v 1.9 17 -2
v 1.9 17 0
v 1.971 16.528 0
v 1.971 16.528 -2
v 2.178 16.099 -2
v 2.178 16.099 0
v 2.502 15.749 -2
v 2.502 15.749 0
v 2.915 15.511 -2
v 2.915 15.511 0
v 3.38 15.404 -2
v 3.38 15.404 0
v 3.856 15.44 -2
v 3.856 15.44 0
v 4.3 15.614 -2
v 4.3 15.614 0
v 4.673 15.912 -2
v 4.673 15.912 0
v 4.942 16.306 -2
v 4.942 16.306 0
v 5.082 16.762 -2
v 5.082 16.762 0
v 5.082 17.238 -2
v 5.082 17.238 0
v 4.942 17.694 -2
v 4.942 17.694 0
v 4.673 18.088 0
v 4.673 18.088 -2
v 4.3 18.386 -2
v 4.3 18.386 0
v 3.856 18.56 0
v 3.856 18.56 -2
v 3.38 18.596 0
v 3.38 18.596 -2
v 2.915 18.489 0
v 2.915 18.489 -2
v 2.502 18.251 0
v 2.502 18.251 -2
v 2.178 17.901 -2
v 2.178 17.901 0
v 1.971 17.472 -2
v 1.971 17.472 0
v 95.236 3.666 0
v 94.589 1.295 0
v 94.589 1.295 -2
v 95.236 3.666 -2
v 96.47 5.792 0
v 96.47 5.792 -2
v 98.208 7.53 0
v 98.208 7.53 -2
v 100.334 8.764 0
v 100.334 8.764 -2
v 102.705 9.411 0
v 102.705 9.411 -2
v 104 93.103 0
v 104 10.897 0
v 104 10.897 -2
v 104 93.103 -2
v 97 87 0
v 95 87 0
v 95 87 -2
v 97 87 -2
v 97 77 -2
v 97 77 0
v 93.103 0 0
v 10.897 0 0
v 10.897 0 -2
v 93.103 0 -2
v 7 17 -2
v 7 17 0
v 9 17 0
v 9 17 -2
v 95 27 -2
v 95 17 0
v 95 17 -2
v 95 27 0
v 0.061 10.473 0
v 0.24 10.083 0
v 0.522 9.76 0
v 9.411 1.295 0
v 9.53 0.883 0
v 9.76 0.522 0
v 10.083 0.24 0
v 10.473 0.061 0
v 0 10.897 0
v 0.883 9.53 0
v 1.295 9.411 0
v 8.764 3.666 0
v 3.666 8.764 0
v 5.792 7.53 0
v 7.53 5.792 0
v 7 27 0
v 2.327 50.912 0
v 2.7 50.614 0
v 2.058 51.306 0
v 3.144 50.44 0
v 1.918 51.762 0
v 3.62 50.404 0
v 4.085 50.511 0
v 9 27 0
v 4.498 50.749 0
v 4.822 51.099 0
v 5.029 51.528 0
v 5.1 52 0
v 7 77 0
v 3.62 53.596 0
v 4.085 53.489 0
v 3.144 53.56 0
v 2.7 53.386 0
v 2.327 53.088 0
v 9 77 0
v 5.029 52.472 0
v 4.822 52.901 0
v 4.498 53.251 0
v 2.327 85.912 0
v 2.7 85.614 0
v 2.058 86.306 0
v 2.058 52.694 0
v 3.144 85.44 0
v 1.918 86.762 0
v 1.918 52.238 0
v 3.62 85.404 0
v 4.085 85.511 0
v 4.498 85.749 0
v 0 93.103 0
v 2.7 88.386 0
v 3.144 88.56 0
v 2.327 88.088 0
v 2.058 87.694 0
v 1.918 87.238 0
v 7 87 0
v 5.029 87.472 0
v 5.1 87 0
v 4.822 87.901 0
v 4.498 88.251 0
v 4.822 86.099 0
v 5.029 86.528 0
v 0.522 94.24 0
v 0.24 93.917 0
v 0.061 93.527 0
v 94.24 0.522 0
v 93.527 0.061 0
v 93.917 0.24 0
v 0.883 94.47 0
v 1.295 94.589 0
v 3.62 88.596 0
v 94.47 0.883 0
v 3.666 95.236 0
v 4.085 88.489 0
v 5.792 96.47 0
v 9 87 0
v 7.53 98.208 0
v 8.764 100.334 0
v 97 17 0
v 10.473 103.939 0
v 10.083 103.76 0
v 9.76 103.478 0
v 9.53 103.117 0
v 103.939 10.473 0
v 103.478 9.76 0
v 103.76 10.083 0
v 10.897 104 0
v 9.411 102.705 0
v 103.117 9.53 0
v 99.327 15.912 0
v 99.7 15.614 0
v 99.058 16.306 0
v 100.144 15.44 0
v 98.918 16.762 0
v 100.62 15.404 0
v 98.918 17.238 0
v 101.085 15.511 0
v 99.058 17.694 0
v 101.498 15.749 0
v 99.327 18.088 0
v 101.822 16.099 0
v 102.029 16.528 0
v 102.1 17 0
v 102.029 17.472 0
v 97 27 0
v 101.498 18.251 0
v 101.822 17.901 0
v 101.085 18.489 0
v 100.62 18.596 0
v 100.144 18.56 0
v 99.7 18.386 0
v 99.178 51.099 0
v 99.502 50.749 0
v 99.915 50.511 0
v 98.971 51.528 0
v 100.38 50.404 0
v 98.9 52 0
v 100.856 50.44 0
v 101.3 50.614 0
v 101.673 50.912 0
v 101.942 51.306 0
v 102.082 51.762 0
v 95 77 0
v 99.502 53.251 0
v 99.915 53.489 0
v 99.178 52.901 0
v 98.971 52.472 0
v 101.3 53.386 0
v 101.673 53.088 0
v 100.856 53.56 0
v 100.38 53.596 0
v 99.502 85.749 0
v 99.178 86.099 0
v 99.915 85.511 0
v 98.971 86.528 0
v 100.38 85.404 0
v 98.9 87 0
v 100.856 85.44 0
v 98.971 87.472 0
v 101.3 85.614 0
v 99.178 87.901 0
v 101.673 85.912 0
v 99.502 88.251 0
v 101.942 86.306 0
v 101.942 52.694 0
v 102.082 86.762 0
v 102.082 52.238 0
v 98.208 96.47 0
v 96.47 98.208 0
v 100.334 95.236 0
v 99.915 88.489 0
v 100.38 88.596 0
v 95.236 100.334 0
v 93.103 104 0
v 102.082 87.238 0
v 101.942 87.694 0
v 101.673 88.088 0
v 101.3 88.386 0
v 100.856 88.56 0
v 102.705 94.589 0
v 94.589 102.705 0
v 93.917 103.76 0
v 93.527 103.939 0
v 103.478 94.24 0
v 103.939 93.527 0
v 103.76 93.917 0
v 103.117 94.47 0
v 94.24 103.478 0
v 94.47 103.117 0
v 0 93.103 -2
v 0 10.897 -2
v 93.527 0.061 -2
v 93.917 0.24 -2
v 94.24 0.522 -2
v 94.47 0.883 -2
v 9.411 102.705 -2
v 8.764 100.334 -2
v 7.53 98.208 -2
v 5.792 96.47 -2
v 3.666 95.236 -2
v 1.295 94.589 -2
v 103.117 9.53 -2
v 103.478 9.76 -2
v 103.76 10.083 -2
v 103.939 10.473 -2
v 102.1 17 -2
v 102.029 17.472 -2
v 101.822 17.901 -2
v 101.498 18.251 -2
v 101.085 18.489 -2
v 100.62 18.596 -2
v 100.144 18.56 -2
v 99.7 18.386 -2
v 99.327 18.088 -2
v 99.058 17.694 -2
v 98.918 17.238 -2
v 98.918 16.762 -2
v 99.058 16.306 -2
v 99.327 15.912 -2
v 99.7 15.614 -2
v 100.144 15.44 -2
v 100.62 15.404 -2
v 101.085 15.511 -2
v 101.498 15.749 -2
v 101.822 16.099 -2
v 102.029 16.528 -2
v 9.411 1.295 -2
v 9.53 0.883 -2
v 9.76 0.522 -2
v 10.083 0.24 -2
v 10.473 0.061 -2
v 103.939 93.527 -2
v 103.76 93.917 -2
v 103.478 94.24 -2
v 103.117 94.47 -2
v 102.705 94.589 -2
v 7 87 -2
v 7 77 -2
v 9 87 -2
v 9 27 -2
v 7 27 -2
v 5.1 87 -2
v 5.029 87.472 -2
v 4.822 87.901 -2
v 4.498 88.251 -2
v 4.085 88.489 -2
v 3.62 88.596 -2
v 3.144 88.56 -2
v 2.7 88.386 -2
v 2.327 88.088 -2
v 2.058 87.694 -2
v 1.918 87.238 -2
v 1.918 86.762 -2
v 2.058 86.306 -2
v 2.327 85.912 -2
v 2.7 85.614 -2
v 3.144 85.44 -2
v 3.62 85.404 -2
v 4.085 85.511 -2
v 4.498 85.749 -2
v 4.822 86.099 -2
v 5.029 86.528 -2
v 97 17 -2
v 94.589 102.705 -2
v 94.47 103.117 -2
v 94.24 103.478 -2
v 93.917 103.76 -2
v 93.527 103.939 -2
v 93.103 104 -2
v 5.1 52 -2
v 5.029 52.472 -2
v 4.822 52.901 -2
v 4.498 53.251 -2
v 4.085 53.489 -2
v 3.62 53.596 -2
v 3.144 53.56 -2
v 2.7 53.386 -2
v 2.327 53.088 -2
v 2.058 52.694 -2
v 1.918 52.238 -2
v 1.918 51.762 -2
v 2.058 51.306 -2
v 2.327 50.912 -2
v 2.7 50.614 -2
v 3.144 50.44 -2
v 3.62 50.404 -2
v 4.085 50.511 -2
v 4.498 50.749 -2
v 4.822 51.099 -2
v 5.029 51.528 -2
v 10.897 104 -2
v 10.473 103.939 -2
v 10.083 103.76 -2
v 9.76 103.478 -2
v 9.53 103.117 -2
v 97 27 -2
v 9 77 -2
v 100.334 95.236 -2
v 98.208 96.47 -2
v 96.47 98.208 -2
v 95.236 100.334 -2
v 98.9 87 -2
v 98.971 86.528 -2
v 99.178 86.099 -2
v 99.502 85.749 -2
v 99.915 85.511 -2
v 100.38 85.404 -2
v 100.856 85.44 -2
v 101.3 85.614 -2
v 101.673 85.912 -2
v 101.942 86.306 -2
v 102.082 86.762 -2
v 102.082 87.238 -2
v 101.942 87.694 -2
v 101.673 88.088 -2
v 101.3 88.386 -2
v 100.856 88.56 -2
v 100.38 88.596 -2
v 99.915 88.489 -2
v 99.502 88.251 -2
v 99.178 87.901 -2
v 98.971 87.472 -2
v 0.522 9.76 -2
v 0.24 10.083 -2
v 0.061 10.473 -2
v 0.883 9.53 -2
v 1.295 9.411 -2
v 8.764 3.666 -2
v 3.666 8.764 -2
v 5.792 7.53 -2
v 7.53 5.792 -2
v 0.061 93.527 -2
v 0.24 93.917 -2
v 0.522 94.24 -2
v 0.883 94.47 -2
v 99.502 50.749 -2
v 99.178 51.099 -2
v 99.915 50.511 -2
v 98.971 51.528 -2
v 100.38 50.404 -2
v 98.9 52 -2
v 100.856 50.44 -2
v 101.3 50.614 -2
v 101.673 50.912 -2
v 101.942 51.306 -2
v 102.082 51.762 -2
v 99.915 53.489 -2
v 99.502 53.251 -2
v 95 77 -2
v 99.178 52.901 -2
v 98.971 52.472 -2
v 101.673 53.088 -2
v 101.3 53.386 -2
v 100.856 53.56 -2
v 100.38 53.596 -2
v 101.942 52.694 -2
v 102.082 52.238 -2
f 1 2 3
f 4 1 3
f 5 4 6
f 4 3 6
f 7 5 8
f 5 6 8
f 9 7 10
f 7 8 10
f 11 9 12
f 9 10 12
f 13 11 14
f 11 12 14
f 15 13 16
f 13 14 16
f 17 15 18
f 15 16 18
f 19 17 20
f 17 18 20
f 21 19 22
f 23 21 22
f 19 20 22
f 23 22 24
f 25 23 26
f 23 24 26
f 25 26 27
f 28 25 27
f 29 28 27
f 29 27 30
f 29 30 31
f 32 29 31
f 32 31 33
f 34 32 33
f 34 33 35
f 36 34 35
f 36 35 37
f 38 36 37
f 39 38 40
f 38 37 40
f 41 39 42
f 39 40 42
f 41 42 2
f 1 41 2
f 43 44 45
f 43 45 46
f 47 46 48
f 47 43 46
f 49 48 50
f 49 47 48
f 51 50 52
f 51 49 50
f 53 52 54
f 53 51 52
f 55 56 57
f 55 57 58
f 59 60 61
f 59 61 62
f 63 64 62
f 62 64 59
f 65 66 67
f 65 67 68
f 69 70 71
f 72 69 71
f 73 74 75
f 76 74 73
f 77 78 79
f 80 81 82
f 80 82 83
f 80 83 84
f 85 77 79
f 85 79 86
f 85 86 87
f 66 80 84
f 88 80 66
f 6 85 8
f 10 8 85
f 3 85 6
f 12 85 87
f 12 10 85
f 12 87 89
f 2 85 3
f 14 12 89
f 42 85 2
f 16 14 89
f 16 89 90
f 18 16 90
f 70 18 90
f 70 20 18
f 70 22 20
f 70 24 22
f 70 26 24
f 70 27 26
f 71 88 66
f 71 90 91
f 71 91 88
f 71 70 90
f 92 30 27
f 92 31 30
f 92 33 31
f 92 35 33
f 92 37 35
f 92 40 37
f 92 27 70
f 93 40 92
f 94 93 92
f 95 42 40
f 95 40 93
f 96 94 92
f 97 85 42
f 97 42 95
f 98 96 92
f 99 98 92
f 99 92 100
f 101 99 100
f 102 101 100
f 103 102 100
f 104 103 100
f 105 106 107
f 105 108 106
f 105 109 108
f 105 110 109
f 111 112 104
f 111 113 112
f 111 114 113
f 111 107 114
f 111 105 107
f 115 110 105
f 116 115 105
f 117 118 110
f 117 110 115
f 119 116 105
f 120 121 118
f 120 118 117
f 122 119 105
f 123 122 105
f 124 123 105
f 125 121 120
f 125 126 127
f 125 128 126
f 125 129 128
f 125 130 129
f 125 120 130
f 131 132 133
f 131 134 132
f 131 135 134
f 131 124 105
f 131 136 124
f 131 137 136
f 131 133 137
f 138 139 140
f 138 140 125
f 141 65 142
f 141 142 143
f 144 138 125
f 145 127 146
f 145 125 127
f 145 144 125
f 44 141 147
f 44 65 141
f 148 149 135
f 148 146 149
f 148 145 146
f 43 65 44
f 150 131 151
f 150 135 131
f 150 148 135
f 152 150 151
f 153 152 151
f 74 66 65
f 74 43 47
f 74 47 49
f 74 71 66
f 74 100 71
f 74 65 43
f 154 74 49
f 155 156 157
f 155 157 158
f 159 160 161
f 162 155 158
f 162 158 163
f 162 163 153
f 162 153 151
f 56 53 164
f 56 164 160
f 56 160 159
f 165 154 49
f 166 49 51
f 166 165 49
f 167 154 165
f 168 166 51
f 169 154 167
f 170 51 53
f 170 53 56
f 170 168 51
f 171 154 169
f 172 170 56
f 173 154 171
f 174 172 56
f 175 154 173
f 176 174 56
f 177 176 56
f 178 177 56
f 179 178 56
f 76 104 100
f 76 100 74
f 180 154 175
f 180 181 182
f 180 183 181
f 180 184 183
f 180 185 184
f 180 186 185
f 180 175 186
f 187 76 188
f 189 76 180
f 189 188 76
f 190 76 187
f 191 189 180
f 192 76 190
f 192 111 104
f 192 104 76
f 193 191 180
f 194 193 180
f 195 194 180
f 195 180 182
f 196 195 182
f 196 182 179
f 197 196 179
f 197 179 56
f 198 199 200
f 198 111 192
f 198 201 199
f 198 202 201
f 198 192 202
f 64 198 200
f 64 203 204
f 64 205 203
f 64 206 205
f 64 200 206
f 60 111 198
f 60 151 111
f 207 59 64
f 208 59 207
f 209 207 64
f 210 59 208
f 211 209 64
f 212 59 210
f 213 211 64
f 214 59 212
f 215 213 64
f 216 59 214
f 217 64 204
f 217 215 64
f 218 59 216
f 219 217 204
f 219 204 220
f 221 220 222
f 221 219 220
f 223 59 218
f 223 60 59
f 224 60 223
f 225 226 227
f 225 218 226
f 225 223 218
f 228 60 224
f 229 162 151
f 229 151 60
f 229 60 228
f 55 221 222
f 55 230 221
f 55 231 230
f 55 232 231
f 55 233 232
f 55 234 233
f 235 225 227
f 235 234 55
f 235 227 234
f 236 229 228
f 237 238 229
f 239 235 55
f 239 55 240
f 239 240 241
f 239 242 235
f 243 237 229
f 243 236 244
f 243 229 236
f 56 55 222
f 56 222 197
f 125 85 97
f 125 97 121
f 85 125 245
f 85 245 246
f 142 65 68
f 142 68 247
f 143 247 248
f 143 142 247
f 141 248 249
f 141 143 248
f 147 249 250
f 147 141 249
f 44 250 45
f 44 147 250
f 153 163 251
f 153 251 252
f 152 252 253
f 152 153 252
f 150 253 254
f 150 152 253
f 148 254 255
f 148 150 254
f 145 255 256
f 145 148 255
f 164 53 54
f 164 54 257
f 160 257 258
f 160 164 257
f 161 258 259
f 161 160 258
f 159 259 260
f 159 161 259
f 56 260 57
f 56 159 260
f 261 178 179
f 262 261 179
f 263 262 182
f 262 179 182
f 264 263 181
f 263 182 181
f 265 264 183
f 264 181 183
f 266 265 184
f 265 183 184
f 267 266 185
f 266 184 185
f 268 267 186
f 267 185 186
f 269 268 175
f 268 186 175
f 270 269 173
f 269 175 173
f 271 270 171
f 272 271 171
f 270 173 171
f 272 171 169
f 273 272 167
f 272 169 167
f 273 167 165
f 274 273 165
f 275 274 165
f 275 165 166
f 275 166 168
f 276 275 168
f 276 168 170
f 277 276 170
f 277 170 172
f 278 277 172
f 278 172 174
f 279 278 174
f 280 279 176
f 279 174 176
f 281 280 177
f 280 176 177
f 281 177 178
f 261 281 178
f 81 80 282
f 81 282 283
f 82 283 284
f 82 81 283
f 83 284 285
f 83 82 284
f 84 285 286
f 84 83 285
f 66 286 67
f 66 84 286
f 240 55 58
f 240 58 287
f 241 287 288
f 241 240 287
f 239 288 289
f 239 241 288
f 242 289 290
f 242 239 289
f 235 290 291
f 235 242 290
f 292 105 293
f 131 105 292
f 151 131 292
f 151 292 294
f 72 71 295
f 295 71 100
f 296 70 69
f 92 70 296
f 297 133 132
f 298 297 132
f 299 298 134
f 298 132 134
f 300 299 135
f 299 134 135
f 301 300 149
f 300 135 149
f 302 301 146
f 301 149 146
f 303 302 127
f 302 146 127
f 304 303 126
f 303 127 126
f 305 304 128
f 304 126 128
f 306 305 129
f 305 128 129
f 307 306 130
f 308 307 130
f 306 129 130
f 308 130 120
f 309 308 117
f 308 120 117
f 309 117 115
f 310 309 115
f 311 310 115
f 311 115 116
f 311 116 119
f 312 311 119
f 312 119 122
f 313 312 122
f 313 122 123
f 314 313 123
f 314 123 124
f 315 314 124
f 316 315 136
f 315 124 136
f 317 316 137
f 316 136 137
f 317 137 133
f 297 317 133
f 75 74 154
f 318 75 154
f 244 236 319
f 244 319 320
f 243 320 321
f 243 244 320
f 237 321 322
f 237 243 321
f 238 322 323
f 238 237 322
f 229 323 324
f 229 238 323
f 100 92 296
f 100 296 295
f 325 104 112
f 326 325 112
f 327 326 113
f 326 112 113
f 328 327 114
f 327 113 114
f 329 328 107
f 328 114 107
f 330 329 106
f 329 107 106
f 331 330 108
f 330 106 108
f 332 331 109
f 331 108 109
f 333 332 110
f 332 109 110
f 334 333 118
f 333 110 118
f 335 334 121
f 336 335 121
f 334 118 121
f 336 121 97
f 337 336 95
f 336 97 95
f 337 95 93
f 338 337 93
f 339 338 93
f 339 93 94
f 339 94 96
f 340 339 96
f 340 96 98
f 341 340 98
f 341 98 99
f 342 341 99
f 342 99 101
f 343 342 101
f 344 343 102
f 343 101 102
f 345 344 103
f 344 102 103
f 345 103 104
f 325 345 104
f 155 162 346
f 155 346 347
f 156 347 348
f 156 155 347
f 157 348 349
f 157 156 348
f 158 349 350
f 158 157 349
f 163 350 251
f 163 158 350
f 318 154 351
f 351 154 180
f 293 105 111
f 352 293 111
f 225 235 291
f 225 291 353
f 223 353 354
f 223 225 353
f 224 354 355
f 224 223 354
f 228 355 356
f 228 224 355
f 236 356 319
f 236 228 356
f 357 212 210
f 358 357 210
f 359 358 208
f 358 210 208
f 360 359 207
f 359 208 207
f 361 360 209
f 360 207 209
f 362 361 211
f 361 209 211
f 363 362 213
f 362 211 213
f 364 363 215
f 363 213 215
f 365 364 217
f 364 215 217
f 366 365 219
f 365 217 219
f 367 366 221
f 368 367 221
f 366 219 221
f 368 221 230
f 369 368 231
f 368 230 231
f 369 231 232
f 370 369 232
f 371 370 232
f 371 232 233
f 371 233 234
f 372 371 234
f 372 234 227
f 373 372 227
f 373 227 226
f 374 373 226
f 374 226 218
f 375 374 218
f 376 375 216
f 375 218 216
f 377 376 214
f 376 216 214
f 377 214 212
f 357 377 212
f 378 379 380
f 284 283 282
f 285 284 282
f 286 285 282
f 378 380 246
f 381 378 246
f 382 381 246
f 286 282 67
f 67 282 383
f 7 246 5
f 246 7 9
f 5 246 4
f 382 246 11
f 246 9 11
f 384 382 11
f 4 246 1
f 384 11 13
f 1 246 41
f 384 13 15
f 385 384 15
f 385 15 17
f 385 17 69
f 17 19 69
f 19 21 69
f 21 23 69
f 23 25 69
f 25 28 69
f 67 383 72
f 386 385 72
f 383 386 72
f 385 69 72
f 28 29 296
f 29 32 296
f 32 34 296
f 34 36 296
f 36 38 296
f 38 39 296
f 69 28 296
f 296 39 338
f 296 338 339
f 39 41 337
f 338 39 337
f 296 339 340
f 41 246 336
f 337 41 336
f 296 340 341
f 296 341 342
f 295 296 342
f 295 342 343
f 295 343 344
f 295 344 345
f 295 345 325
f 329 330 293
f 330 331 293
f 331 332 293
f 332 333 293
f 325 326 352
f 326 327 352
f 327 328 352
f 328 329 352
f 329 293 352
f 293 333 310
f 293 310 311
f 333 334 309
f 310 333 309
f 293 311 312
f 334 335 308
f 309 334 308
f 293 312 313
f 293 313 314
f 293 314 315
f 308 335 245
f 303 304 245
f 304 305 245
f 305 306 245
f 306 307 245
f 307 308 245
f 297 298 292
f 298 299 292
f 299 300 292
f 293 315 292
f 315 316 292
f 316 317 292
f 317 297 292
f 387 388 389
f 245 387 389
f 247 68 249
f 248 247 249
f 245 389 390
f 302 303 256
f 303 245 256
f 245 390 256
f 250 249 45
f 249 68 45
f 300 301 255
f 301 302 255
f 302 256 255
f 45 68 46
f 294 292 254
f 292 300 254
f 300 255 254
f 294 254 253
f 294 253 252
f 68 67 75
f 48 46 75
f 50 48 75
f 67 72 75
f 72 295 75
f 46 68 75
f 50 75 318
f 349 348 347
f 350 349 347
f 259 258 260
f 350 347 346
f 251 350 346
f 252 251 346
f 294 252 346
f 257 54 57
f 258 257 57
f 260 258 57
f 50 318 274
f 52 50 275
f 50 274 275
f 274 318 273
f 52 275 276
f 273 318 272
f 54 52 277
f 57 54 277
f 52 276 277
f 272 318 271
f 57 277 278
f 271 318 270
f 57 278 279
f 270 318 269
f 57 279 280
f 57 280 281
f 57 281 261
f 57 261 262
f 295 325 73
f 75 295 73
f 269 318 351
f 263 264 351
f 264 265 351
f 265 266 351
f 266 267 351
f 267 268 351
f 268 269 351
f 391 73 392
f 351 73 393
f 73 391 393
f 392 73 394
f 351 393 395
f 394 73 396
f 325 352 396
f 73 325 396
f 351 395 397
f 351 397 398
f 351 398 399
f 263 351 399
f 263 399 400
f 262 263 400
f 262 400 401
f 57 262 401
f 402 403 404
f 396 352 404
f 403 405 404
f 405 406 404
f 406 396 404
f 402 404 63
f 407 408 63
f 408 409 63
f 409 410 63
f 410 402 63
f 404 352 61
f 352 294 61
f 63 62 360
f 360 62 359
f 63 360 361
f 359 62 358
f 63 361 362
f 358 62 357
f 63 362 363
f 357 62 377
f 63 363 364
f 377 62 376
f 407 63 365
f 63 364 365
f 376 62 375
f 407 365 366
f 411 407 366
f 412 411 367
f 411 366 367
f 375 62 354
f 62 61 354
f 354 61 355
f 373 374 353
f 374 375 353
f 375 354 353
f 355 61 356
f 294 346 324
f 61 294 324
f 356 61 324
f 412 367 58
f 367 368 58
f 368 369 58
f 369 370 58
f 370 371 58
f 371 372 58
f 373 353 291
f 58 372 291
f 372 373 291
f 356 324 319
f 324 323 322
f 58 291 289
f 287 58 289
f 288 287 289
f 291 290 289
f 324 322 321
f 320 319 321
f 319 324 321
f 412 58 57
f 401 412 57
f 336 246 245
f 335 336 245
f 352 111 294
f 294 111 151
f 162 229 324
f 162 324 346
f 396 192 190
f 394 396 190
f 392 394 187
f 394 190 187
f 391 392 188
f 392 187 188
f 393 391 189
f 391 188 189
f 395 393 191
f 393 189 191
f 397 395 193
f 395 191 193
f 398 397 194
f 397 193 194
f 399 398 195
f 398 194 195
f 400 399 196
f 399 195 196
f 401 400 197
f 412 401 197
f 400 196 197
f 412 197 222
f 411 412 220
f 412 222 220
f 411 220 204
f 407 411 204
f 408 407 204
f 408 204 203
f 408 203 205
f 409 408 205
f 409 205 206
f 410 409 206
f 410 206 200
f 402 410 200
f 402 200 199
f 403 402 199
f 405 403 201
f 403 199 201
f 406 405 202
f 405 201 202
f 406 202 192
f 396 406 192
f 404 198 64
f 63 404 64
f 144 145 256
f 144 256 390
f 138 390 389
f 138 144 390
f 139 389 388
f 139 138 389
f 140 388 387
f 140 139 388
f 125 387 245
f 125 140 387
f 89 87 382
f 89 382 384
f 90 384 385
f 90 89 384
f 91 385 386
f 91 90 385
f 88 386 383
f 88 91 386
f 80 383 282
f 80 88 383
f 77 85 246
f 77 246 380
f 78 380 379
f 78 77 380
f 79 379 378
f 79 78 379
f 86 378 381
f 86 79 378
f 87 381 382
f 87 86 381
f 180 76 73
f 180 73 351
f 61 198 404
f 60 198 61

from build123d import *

# Parameters (mm, degrees)
CROQUIS1_R              = 1.6
CROQUIS1_W              = 2
CROQUIS1_H              = 10
SALIENTE_EXTRUIR1_DEPTH = 2


with BuildPart() as part:
    # Croquis1 → Saliente-Extruir1 (new body)
    with BuildSketch(Plane.XY):
        with BuildLine():
            Line((10.897247359, 0), (93.102752641, 0))
            ThreePointArc((93.102752641, 0), (94.088445752, 0.369332458), (94.588740917, 1.295454545))
            ThreePointArc((94.588740917, 1.295454545), (97.282485579, 6.717514421), (102.704545455, 9.411259083))
            ThreePointArc((102.704545455, 9.411259083), (103.630667542, 9.911554248), (104, 10.897247359))
            Line((104, 10.897247359), (104, 93.102752641))
            ThreePointArc((104, 93.102752641), (103.630667542, 94.088445752), (102.704545455, 94.588740917))
            ThreePointArc((102.704545455, 94.588740917), (97.282485579, 97.282485579), (94.588740917, 102.704545455))
            ThreePointArc((94.588740917, 102.704545455), (94.088445752, 103.630667542), (93.102752641, 104))
            Line((93.102752641, 104), (10.897247359, 104))
            ThreePointArc((10.897247359, 104), (9.911554248, 103.630667542), (9.411259083, 102.704545455))
            ThreePointArc((9.411259083, 102.704545455), (6.717514421, 97.282485579), (1.295454545, 94.588740917))
            ThreePointArc((1.295454545, 94.588740917), (0.369332458, 94.088445752), (0, 93.102752641))
            Line((0, 93.102752641), (0, 10.897247359))
            ThreePointArc((0, 10.897247359), (0.369332458, 9.911554248), (1.295454545, 9.411259083))
            ThreePointArc((1.295454545, 9.411259083), (6.717514421, 6.717514421), (9.411259083, 1.295454545))
            ThreePointArc((9.411259083, 1.295454545), (9.911554248, 0.369332458), (10.897247359, 0))
        make_face()
        with Locations((3.5, 52)):
            Circle(CROQUIS1_R, mode=Mode.SUBTRACT)
        with Locations((3.5, 87)):
            Circle(CROQUIS1_R, mode=Mode.SUBTRACT)
        with Locations(Location((3.5, 17, 0), (0, 0, 180))):
            Circle(CROQUIS1_R, mode=Mode.SUBTRACT)
        with Locations((100.5, 17)):
            Circle(CROQUIS1_R, mode=Mode.SUBTRACT)
        with Locations(Location((100.5, 52, 0), (0, 0, 180))):
            Circle(CROQUIS1_R, mode=Mode.SUBTRACT)
        with Locations(Location((100.5, 87, 0), (0, 0, 180))):
            Circle(CROQUIS1_R, mode=Mode.SUBTRACT)
        with Locations((8, 82)):
            Rectangle(CROQUIS1_W, CROQUIS1_H, mode=Mode.SUBTRACT)
        with Locations((96, 82)):
            Rectangle(CROQUIS1_W, CROQUIS1_H, mode=Mode.SUBTRACT)
        with Locations((96, 22)):
            Rectangle(CROQUIS1_W, CROQUIS1_H, mode=Mode.SUBTRACT)
        with Locations((8, 22)):
            Rectangle(CROQUIS1_W, CROQUIS1_H, mode=Mode.SUBTRACT)
    extrude(amount=-SALIENTE_EXTRUIR1_DEPTH)


solid = part.part
